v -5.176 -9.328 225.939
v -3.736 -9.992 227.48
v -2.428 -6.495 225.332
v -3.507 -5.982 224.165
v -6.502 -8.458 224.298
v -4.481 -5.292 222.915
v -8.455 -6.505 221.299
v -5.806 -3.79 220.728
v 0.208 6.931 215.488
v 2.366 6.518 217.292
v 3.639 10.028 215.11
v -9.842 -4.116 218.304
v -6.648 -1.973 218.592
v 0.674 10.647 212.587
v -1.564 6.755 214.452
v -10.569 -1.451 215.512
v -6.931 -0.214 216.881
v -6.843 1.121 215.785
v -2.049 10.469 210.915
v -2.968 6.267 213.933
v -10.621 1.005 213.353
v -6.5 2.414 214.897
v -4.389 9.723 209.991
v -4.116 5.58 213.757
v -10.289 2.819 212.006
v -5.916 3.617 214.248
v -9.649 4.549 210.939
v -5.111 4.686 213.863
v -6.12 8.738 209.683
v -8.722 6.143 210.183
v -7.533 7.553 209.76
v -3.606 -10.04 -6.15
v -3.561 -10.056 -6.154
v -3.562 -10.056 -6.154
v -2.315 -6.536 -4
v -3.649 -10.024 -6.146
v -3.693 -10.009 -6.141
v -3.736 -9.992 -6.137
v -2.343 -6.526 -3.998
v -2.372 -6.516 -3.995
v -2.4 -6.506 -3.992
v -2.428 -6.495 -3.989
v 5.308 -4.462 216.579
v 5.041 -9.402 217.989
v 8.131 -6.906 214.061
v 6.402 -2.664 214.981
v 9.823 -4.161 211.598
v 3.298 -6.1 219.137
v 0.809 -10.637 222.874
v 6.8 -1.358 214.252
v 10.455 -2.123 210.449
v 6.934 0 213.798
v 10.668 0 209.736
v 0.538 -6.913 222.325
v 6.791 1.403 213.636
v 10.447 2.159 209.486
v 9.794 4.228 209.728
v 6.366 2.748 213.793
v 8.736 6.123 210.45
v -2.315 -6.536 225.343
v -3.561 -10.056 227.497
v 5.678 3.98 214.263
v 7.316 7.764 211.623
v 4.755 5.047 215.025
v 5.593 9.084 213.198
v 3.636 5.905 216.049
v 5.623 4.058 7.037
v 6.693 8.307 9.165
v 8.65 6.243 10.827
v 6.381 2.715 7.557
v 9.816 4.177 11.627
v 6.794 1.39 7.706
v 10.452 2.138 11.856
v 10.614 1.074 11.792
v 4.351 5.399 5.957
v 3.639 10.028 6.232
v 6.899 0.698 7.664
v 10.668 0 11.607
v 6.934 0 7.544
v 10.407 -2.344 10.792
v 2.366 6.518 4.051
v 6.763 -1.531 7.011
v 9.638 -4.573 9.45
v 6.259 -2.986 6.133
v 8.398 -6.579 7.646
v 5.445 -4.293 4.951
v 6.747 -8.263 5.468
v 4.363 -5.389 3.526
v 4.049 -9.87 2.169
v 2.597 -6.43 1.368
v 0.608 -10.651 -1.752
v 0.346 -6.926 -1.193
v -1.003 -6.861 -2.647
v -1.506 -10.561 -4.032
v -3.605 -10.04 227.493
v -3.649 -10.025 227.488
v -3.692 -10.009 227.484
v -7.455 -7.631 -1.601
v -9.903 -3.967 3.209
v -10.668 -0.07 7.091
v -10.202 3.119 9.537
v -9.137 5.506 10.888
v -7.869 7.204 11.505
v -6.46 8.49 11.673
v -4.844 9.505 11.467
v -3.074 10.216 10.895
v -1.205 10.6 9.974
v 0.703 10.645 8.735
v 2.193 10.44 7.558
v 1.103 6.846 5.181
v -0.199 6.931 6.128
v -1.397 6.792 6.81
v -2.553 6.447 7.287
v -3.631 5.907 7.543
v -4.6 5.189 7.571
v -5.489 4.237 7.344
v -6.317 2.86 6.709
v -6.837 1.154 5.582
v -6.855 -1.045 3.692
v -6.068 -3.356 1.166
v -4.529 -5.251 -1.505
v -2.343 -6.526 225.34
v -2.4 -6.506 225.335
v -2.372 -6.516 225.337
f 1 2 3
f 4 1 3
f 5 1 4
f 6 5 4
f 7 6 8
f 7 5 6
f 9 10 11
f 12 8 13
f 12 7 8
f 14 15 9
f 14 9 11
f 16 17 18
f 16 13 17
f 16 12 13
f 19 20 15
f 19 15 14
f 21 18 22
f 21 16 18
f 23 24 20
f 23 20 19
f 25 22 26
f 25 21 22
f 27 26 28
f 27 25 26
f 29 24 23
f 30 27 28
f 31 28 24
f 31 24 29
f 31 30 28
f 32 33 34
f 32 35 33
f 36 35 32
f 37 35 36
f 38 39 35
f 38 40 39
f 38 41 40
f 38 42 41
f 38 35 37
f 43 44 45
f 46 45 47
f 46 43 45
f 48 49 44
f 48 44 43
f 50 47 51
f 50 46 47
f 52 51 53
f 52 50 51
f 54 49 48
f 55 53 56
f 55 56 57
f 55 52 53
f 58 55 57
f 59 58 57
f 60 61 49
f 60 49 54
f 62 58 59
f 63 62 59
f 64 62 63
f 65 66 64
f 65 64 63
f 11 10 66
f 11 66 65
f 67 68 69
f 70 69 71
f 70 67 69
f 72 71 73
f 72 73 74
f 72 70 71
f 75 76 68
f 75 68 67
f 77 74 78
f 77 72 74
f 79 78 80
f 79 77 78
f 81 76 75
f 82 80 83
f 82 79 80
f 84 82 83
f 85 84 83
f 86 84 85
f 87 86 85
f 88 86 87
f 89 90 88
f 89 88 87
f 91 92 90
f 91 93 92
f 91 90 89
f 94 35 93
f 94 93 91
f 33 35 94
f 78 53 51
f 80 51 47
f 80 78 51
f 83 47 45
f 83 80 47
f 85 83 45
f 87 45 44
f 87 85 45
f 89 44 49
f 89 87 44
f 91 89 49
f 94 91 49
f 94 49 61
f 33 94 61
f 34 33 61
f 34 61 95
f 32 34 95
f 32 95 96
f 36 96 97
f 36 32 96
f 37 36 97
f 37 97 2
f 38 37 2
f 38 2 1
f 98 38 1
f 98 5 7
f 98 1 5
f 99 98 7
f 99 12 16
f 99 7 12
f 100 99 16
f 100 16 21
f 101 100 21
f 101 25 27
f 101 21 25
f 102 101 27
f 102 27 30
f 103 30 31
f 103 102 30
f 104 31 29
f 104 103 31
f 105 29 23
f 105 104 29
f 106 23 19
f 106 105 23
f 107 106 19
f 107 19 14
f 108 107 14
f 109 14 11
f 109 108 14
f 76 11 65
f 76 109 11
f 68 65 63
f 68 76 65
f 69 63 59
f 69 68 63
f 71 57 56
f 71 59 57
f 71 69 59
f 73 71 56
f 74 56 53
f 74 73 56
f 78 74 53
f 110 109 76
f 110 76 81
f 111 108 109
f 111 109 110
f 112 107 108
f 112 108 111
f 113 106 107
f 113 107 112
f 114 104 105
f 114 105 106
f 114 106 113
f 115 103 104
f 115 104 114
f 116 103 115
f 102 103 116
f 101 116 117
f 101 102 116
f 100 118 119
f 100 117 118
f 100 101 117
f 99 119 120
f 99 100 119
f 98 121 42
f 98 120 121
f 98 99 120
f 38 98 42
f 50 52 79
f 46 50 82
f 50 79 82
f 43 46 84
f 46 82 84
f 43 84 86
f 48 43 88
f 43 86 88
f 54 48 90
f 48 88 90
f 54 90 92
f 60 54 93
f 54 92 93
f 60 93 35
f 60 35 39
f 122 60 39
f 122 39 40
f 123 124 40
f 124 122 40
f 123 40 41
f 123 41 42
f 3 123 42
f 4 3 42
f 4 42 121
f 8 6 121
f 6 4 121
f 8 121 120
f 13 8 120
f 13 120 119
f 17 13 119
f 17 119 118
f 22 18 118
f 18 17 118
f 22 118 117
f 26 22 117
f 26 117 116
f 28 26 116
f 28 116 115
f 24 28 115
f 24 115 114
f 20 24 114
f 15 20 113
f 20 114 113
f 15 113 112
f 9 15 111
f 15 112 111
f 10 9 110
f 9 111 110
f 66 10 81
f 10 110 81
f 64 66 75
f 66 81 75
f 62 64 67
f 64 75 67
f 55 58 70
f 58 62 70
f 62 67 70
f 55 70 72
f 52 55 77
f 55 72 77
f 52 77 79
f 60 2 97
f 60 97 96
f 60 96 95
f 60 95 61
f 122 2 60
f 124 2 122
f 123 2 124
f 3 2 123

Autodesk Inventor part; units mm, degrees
ref_plane "Start Plane" through (0, 0, -6.1539) normal (0, 0, 1) x (1, 0, 0)
ref_plane "End Plane" through (0, 0, 227.4965) normal (0, 0, 1) x (1, 0, 0)
sketch "Sketch" plane through (0, 0, 0) normal (0, 0, 1) x (1, 0, 0)
  circle A0 centre (0, 0) radius 6.9342
  circle A1 centre (0, 0) radius 10.668
  dimension "d0" = 21.336
  dimension "d1" = 3.7338
extrude "Body" add sketch "Sketch" along normal up to surface (233.6505 mm away) from surface at -6.1539
sketch "Sketch3" plane through (0, 0, 0) normal (0, 0, 1) x (1, 0, 0)
  line L0 (0, 0) -> (10, 0)
ref_plane "Work Plane3" through (0, 0, 0) normal (0, -1, 0) x (1, 0, 0)
sketch "Sketch4" plane through (0, 0, 0) normal (0, -1, 0) x (1, 0, 0)
  line L0 (-2, -6.1539) -> (12, -6.1539)
  line L1 (-2, 227.4965) -> (12, 227.4965)
  dimension "d7" = 233.6505
ref_plane "Work Plane4" through (-10.4438, -2.1758, 233.1995) normal (0.7278, 0.1516, 0.6689) x (0.6826, -0.0661, -0.7278)
split "Split1" plane through (-10.4438, -2.1758, 233.1995) removes the side toward (0.7278, 0.1516, 0.6689)
ref_plane "Work Plane5" through (-2.0318, -10.4727, 227.5652) normal (0.096, 0.4946, 0.8638) x (0.9951, -0.0255, -0.096)
split "Split2" plane through (-2.0318, -10.4727, 227.5652) removes the side toward (0.096, 0.4946, 0.8638)
ref_plane "Work Plane6" through (6.5371, -8.4304, 233.0164) normal (-0.4523, 0.5834, 0.6746) x (0.8778, 0.1576, 0.4523)
split "Split3" plane through (6.5371, -8.4304, 233.0164) removes the side toward (-0.4523, 0.5834, 0.6746)
ref_plane "Work Plane7" through (-2.0318, -10.4727, -6.2226) normal (0.096, 0.4946, -0.8638) x (0.9324, -0.3485, -0.096)
split "Split4" plane through (-2.0318, -10.4727, -6.2226) removes the side toward (0.096, 0.4946, -0.8638)
ref_plane "Work Plane8" through (-10.4438, -2.1758, -11.8569) normal (0.7278, 0.1516, -0.6689) x (-0.5994, -0.3332, -0.7278)
split "Split5" plane through (-10.4438, -2.1758, -11.8569) removes the side toward (0.7278, 0.1516, -0.6689)
ref_plane "Work Plane9" through (6.5371, -8.4304, -11.6738) normal (-0.4523, 0.5834, -0.6746) x (0.3712, 0.8109, 0.4523)
split "Split6" plane through (6.5371, -8.4304, -11.6738) removes the side toward (-0.4523, 0.5834, -0.6746)
equation "\"d0\" = G_H"
equation "\"d1\" = G_T"
equation "\"d2\" = G_L"
equation "\"G_H\" = 21.336"
equation "\"G_T\" = 3.7338"
equation "\"G_L\" = 233.65046"
equation "\"G_OFFSET_START\" = 6.15394"
equation "\"G_OFFSET_END\" = 6.15394"
equation "\"d4\" = -G_OFFSET_START"
equation "\"d5\" = G_OFFSET_END + B_L"
equation "\"B_L\" = 221.34258"
properties part number "ANSI - 1/2 x 0.147 - 9.199" material "Steel, Mild"
